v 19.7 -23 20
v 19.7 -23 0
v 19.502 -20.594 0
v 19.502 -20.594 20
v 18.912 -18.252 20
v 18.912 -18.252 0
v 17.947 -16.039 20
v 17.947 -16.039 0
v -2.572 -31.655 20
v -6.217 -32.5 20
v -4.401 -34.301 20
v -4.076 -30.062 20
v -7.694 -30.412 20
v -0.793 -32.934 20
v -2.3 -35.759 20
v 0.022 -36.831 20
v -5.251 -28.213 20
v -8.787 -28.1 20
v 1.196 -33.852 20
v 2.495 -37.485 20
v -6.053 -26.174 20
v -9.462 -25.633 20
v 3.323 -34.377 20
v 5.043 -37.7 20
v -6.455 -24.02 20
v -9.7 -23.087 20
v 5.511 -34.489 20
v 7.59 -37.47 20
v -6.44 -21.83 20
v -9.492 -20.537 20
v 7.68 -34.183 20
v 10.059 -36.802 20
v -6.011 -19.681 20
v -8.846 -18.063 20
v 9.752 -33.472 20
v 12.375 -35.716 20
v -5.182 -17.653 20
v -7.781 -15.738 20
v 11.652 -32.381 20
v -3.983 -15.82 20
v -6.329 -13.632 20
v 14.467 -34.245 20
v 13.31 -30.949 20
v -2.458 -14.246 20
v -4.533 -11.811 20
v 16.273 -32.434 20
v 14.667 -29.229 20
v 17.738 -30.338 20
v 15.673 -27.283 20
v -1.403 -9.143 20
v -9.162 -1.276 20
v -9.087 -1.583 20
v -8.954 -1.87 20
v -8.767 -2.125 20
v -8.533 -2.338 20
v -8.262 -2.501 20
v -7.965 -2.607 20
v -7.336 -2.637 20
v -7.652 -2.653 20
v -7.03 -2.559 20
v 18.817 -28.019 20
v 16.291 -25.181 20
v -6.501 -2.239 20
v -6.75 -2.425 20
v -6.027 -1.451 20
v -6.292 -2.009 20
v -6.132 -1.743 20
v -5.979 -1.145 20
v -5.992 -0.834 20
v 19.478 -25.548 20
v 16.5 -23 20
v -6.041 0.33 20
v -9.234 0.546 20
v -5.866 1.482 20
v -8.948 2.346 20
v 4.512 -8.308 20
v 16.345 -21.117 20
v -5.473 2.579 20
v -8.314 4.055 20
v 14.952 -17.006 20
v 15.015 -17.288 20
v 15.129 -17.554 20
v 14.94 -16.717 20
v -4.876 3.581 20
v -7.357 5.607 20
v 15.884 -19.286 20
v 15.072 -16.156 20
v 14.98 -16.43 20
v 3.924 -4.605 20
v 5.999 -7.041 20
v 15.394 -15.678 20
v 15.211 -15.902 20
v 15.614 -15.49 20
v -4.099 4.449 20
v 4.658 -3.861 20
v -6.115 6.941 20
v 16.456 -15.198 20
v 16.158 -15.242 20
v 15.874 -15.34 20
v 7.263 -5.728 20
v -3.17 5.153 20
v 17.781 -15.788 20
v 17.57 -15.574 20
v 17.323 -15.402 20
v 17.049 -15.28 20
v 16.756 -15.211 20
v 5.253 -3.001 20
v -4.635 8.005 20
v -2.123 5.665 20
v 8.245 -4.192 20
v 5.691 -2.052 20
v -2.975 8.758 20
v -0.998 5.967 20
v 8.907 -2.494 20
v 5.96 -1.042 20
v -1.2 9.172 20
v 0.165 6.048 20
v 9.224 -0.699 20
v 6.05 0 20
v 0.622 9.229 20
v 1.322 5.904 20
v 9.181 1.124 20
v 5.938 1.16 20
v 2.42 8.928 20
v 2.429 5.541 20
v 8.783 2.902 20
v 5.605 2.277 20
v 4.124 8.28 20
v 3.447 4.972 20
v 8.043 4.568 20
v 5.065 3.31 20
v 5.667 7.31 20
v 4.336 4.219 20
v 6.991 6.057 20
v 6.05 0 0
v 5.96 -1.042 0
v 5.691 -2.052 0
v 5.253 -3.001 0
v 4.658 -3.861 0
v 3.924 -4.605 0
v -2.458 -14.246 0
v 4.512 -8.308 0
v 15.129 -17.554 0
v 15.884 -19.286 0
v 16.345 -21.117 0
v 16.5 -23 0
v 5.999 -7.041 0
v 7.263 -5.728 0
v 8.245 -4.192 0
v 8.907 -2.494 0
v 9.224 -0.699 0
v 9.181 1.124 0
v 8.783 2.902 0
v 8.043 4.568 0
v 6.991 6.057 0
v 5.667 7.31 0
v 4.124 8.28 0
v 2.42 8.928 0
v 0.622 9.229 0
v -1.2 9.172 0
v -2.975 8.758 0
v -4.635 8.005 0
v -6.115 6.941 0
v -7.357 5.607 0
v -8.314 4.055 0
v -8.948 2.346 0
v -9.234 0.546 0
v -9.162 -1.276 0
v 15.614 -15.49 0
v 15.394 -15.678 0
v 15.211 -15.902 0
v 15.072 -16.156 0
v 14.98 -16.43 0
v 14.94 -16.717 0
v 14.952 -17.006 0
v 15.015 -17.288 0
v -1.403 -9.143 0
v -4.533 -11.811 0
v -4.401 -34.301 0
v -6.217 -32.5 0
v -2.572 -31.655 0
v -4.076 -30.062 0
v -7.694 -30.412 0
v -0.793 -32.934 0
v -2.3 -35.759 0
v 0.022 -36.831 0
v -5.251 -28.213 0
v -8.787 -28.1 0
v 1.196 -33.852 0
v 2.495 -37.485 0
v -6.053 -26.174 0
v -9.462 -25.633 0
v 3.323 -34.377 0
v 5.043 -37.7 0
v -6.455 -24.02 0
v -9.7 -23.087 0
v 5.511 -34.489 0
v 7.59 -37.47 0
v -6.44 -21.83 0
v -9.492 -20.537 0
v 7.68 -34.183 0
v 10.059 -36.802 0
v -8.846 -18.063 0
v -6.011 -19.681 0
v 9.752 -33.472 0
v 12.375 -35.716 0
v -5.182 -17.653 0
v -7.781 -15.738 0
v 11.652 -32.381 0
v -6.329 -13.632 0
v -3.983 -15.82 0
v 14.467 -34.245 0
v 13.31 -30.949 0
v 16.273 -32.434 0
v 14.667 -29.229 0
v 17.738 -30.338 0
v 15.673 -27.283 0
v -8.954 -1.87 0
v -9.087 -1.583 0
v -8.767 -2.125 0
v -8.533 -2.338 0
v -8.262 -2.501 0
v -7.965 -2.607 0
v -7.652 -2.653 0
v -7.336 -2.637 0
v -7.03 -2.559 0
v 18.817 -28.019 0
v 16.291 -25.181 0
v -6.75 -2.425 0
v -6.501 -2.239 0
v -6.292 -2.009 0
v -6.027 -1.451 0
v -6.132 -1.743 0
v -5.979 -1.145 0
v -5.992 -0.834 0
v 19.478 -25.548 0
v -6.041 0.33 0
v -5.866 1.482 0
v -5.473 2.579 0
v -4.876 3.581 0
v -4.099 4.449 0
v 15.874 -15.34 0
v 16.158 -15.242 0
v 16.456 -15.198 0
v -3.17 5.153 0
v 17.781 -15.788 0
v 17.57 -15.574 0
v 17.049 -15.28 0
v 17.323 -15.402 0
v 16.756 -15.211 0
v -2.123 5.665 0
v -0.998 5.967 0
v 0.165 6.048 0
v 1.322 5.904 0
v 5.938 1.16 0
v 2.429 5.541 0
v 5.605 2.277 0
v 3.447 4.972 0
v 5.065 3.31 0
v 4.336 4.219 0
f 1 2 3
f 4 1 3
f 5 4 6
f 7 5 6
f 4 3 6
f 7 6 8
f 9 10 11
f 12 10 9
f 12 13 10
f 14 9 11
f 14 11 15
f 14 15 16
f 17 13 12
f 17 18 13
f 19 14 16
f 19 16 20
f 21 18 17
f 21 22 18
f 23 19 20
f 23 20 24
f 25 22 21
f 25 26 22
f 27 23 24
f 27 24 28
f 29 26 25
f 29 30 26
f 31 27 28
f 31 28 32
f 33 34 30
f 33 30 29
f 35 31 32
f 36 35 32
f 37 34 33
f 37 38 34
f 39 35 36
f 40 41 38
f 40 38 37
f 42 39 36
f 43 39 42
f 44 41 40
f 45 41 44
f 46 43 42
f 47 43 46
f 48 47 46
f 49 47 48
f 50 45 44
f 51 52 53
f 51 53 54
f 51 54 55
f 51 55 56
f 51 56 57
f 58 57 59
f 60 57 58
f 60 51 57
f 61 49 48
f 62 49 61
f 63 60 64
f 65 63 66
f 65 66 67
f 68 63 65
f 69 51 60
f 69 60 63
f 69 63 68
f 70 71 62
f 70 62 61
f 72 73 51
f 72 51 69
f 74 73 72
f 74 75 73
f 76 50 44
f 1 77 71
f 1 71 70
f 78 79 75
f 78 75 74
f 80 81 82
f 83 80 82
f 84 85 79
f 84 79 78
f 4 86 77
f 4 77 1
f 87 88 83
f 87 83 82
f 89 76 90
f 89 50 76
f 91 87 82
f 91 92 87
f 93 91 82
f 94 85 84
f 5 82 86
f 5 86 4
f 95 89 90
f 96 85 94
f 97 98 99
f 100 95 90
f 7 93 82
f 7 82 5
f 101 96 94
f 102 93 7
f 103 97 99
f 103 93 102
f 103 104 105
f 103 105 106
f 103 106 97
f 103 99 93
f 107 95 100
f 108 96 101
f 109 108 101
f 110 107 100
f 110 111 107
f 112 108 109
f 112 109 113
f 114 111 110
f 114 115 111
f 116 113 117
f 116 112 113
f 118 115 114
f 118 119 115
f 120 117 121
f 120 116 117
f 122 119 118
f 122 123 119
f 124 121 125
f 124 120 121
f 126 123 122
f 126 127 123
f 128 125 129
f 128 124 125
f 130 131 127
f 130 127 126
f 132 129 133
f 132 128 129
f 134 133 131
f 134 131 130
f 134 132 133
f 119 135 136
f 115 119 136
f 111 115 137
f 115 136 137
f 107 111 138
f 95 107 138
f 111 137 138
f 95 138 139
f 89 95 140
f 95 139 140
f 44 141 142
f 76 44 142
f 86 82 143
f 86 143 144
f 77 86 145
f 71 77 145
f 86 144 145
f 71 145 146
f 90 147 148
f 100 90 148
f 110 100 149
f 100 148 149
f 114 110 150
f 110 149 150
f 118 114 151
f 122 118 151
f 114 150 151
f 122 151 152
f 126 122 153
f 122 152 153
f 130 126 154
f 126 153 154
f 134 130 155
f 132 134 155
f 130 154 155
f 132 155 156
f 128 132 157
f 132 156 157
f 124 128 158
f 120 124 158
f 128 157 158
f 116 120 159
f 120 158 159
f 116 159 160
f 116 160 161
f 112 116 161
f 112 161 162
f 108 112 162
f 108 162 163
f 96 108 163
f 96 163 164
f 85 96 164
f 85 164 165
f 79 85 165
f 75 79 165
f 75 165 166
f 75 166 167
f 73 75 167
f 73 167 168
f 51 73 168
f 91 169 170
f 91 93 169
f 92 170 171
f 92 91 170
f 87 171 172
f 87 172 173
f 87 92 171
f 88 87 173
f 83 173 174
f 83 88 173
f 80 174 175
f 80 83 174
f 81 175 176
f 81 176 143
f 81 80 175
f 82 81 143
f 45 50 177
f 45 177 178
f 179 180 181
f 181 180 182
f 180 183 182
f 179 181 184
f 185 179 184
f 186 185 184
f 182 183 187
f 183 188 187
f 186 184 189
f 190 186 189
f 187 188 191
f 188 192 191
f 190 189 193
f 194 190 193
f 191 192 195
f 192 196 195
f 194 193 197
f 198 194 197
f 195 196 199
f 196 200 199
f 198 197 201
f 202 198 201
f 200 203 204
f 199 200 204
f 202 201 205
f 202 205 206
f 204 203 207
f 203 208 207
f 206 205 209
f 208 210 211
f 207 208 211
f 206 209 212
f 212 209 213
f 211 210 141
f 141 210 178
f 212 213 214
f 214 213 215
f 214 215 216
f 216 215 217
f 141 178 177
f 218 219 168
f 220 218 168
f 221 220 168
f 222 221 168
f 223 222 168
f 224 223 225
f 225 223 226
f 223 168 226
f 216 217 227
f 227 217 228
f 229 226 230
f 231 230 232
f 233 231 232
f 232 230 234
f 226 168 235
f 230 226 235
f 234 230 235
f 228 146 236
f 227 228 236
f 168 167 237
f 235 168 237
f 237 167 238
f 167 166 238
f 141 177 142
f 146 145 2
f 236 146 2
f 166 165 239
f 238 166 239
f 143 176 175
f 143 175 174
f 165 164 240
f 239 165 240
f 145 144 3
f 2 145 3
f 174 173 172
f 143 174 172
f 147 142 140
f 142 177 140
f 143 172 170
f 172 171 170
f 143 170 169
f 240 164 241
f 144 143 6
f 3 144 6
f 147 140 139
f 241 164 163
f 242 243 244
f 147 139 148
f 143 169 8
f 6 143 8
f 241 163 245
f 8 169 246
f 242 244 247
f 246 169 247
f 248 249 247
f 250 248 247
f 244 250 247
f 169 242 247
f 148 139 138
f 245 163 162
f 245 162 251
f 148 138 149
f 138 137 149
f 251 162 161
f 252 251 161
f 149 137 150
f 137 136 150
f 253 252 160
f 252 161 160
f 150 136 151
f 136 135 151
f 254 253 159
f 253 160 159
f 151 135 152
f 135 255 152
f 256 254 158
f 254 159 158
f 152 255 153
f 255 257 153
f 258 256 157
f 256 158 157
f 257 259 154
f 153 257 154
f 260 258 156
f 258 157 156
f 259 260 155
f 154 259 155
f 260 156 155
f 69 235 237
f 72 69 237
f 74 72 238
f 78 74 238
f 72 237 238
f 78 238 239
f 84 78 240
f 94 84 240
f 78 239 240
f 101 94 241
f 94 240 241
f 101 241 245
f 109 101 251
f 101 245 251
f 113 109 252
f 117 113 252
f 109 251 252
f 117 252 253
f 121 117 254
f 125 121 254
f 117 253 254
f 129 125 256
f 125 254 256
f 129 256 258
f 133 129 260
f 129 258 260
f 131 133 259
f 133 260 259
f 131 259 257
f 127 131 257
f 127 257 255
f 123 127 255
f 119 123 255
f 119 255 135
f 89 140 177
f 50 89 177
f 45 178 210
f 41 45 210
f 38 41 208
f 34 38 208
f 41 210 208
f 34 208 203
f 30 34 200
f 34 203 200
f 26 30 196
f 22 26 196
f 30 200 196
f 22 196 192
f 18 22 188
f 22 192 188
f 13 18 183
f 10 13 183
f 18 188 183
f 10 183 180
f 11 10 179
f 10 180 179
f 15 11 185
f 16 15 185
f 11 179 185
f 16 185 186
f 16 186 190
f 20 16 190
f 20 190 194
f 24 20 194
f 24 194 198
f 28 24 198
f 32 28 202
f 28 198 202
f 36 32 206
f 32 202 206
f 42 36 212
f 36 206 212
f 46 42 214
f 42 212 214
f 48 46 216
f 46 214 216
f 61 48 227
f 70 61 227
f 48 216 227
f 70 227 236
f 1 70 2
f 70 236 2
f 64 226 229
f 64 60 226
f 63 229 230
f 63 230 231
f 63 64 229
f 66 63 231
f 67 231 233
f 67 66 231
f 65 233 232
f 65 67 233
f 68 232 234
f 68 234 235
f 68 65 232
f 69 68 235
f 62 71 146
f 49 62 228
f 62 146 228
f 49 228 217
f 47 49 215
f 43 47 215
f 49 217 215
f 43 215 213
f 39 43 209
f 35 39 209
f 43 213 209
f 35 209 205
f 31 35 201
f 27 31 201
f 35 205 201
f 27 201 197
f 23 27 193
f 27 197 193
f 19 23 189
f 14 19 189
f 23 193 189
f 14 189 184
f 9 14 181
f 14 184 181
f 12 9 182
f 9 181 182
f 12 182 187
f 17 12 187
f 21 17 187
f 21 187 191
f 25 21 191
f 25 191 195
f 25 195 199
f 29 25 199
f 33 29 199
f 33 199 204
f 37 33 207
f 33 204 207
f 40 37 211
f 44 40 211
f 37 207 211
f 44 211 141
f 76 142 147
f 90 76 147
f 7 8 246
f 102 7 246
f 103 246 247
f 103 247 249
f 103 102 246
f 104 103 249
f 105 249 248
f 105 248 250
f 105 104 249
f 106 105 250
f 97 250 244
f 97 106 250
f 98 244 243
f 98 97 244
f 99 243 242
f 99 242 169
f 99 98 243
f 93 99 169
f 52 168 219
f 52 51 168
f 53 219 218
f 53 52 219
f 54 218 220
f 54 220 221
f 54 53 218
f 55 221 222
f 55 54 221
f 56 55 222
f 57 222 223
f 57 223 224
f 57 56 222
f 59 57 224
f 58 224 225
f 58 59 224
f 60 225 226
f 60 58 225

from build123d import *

# Parameters (mm, degrees)
F1_DEPTH = 20
F2_R     = 1.59999


# Not quite as in the source:
# - a fillet or chamfer is up to 0.001 mm smaller than in the source, because OpenCascade refuses the exact size


with BuildPart() as f1:
    # F0 (on Top) → F1 (new body)
    with BuildSketch(Plane.XY):
        with BuildLine():
            ThreePointArc((6.05, 0), (5.4927369002, -2.5362060928), (3.9236061669, -4.6051943115))
            Line((3.9236061669, -4.6051943115), (-1.4025425598, -9.1430506051))
            ThreePointArc((-1.4025425598, -9.1430506051), (-0.799716174, -9.2153651062), (-0.1934443699, -9.2479770369))
            ThreePointArc((-0.1934443699, -9.2479770369), (1.8772842283, -8.6355074503), (4.015398341, -8.3330112302))
            ThreePointArc((4.015398341, -8.3330112302), (5.0486509404, -7.7507176237), (5.9989019907, -7.0409995672))
            ThreePointArc((5.9989019907, -7.0409995672), (8.3979861697, -3.8776704725), (9.25, 0))
            ThreePointArc((9.25, 0), (-1.6062456434, 9.1094717154), (-8.6921567423, -3.1636863258))
            Line((-8.6921567423, -3.1636863258), (-5.6851403558, -2.0692218671))
            ThreePointArc((-5.6851403558, -2.0692218671), (-1.0505714749, 5.9580869057), (6.05, 0))
        make_face()
        with BuildLine():
            ThreePointArc((4.015398341, -8.3330112302), (1.9649742101, -9.0388813663), (-0.1934443699, -9.2479770369))
            ThreePointArc((-0.1934443699, -9.2479770369), (-2.4740598171, -10.3418630972), (-4.5333901906, -11.8105196067))
            ThreePointArc((-4.5333901906, -11.8105196067), (-1.1623519941, -36.3459888319), (19.7, -23))
            ThreePointArc((19.7, -23), (19.0087472673, -18.5452272785), (17, -14.5094169811))
            Line((17, -14.5094169811), (14.387755102, -16.3577071621))
            ThreePointArc((14.387755102, -16.3577071621), (15.9592240527, -19.5149737213), (16.5, -23))
            ThreePointArc((16.5, -23), (0.1791123856, -33.4407395624), (-2.4580943668, -14.2463248624))
            Line((-2.4580943668, -14.2463248624), (4.5116719892, -8.3081132677))
            ThreePointArc((4.5116719892, -8.3081132677), (4.2634299557, -8.3184651834), (4.015398341, -8.3330112302))
        make_face()
        with BuildLine():
            ThreePointArc((-0.1934443699, -9.2479770369), (-0.799716174, -9.2153651062), (-1.4025425598, -9.1430506051))
            Line((-1.4025425598, -9.1430506051), (-4.5333901906, -11.8105196067))
            ThreePointArc((-4.5333901906, -11.8105196067), (-2.4740598171, -10.3418630972), (-0.1934443699, -9.2479770369))
        make_face()
        with BuildLine():
            ThreePointArc((4.015398341, -8.3330112302), (1.8772842283, -8.6355074503), (-0.1934443699, -9.2479770369))
            ThreePointArc((-0.1934443699, -9.2479770369), (1.9649742101, -9.0388813663), (4.015398341, -8.3330112302))
        make_face()
        with BuildLine():
            ThreePointArc((5.9989019907, -7.0409995672), (5.0486509404, -7.7507176237), (4.015398341, -8.3330112302))
            ThreePointArc((4.015398341, -8.3330112302), (4.2634299557, -8.3184651834), (4.5116719892, -8.3081132677))
            Line((4.5116719892, -8.3081132677), (5.9989019907, -7.0409995672))
        make_face()
    extrude(amount=F1_DEPTH)

    # F2 (radius 1.6 in the source; OpenCascade refuses exactly that, so slightly less here)
    f2_edges = [f1.edges().sort_by_distance(p)[0] for p in [
        (17, -14.509417, 10),
        (14.387755, -16.357707, 10),
        (-8.692157, -3.163686, 10),
        (-5.68514, -2.069222, 10),
    ]]
    fillet(f2_edges, radius=F2_R)


solid = f1.part
